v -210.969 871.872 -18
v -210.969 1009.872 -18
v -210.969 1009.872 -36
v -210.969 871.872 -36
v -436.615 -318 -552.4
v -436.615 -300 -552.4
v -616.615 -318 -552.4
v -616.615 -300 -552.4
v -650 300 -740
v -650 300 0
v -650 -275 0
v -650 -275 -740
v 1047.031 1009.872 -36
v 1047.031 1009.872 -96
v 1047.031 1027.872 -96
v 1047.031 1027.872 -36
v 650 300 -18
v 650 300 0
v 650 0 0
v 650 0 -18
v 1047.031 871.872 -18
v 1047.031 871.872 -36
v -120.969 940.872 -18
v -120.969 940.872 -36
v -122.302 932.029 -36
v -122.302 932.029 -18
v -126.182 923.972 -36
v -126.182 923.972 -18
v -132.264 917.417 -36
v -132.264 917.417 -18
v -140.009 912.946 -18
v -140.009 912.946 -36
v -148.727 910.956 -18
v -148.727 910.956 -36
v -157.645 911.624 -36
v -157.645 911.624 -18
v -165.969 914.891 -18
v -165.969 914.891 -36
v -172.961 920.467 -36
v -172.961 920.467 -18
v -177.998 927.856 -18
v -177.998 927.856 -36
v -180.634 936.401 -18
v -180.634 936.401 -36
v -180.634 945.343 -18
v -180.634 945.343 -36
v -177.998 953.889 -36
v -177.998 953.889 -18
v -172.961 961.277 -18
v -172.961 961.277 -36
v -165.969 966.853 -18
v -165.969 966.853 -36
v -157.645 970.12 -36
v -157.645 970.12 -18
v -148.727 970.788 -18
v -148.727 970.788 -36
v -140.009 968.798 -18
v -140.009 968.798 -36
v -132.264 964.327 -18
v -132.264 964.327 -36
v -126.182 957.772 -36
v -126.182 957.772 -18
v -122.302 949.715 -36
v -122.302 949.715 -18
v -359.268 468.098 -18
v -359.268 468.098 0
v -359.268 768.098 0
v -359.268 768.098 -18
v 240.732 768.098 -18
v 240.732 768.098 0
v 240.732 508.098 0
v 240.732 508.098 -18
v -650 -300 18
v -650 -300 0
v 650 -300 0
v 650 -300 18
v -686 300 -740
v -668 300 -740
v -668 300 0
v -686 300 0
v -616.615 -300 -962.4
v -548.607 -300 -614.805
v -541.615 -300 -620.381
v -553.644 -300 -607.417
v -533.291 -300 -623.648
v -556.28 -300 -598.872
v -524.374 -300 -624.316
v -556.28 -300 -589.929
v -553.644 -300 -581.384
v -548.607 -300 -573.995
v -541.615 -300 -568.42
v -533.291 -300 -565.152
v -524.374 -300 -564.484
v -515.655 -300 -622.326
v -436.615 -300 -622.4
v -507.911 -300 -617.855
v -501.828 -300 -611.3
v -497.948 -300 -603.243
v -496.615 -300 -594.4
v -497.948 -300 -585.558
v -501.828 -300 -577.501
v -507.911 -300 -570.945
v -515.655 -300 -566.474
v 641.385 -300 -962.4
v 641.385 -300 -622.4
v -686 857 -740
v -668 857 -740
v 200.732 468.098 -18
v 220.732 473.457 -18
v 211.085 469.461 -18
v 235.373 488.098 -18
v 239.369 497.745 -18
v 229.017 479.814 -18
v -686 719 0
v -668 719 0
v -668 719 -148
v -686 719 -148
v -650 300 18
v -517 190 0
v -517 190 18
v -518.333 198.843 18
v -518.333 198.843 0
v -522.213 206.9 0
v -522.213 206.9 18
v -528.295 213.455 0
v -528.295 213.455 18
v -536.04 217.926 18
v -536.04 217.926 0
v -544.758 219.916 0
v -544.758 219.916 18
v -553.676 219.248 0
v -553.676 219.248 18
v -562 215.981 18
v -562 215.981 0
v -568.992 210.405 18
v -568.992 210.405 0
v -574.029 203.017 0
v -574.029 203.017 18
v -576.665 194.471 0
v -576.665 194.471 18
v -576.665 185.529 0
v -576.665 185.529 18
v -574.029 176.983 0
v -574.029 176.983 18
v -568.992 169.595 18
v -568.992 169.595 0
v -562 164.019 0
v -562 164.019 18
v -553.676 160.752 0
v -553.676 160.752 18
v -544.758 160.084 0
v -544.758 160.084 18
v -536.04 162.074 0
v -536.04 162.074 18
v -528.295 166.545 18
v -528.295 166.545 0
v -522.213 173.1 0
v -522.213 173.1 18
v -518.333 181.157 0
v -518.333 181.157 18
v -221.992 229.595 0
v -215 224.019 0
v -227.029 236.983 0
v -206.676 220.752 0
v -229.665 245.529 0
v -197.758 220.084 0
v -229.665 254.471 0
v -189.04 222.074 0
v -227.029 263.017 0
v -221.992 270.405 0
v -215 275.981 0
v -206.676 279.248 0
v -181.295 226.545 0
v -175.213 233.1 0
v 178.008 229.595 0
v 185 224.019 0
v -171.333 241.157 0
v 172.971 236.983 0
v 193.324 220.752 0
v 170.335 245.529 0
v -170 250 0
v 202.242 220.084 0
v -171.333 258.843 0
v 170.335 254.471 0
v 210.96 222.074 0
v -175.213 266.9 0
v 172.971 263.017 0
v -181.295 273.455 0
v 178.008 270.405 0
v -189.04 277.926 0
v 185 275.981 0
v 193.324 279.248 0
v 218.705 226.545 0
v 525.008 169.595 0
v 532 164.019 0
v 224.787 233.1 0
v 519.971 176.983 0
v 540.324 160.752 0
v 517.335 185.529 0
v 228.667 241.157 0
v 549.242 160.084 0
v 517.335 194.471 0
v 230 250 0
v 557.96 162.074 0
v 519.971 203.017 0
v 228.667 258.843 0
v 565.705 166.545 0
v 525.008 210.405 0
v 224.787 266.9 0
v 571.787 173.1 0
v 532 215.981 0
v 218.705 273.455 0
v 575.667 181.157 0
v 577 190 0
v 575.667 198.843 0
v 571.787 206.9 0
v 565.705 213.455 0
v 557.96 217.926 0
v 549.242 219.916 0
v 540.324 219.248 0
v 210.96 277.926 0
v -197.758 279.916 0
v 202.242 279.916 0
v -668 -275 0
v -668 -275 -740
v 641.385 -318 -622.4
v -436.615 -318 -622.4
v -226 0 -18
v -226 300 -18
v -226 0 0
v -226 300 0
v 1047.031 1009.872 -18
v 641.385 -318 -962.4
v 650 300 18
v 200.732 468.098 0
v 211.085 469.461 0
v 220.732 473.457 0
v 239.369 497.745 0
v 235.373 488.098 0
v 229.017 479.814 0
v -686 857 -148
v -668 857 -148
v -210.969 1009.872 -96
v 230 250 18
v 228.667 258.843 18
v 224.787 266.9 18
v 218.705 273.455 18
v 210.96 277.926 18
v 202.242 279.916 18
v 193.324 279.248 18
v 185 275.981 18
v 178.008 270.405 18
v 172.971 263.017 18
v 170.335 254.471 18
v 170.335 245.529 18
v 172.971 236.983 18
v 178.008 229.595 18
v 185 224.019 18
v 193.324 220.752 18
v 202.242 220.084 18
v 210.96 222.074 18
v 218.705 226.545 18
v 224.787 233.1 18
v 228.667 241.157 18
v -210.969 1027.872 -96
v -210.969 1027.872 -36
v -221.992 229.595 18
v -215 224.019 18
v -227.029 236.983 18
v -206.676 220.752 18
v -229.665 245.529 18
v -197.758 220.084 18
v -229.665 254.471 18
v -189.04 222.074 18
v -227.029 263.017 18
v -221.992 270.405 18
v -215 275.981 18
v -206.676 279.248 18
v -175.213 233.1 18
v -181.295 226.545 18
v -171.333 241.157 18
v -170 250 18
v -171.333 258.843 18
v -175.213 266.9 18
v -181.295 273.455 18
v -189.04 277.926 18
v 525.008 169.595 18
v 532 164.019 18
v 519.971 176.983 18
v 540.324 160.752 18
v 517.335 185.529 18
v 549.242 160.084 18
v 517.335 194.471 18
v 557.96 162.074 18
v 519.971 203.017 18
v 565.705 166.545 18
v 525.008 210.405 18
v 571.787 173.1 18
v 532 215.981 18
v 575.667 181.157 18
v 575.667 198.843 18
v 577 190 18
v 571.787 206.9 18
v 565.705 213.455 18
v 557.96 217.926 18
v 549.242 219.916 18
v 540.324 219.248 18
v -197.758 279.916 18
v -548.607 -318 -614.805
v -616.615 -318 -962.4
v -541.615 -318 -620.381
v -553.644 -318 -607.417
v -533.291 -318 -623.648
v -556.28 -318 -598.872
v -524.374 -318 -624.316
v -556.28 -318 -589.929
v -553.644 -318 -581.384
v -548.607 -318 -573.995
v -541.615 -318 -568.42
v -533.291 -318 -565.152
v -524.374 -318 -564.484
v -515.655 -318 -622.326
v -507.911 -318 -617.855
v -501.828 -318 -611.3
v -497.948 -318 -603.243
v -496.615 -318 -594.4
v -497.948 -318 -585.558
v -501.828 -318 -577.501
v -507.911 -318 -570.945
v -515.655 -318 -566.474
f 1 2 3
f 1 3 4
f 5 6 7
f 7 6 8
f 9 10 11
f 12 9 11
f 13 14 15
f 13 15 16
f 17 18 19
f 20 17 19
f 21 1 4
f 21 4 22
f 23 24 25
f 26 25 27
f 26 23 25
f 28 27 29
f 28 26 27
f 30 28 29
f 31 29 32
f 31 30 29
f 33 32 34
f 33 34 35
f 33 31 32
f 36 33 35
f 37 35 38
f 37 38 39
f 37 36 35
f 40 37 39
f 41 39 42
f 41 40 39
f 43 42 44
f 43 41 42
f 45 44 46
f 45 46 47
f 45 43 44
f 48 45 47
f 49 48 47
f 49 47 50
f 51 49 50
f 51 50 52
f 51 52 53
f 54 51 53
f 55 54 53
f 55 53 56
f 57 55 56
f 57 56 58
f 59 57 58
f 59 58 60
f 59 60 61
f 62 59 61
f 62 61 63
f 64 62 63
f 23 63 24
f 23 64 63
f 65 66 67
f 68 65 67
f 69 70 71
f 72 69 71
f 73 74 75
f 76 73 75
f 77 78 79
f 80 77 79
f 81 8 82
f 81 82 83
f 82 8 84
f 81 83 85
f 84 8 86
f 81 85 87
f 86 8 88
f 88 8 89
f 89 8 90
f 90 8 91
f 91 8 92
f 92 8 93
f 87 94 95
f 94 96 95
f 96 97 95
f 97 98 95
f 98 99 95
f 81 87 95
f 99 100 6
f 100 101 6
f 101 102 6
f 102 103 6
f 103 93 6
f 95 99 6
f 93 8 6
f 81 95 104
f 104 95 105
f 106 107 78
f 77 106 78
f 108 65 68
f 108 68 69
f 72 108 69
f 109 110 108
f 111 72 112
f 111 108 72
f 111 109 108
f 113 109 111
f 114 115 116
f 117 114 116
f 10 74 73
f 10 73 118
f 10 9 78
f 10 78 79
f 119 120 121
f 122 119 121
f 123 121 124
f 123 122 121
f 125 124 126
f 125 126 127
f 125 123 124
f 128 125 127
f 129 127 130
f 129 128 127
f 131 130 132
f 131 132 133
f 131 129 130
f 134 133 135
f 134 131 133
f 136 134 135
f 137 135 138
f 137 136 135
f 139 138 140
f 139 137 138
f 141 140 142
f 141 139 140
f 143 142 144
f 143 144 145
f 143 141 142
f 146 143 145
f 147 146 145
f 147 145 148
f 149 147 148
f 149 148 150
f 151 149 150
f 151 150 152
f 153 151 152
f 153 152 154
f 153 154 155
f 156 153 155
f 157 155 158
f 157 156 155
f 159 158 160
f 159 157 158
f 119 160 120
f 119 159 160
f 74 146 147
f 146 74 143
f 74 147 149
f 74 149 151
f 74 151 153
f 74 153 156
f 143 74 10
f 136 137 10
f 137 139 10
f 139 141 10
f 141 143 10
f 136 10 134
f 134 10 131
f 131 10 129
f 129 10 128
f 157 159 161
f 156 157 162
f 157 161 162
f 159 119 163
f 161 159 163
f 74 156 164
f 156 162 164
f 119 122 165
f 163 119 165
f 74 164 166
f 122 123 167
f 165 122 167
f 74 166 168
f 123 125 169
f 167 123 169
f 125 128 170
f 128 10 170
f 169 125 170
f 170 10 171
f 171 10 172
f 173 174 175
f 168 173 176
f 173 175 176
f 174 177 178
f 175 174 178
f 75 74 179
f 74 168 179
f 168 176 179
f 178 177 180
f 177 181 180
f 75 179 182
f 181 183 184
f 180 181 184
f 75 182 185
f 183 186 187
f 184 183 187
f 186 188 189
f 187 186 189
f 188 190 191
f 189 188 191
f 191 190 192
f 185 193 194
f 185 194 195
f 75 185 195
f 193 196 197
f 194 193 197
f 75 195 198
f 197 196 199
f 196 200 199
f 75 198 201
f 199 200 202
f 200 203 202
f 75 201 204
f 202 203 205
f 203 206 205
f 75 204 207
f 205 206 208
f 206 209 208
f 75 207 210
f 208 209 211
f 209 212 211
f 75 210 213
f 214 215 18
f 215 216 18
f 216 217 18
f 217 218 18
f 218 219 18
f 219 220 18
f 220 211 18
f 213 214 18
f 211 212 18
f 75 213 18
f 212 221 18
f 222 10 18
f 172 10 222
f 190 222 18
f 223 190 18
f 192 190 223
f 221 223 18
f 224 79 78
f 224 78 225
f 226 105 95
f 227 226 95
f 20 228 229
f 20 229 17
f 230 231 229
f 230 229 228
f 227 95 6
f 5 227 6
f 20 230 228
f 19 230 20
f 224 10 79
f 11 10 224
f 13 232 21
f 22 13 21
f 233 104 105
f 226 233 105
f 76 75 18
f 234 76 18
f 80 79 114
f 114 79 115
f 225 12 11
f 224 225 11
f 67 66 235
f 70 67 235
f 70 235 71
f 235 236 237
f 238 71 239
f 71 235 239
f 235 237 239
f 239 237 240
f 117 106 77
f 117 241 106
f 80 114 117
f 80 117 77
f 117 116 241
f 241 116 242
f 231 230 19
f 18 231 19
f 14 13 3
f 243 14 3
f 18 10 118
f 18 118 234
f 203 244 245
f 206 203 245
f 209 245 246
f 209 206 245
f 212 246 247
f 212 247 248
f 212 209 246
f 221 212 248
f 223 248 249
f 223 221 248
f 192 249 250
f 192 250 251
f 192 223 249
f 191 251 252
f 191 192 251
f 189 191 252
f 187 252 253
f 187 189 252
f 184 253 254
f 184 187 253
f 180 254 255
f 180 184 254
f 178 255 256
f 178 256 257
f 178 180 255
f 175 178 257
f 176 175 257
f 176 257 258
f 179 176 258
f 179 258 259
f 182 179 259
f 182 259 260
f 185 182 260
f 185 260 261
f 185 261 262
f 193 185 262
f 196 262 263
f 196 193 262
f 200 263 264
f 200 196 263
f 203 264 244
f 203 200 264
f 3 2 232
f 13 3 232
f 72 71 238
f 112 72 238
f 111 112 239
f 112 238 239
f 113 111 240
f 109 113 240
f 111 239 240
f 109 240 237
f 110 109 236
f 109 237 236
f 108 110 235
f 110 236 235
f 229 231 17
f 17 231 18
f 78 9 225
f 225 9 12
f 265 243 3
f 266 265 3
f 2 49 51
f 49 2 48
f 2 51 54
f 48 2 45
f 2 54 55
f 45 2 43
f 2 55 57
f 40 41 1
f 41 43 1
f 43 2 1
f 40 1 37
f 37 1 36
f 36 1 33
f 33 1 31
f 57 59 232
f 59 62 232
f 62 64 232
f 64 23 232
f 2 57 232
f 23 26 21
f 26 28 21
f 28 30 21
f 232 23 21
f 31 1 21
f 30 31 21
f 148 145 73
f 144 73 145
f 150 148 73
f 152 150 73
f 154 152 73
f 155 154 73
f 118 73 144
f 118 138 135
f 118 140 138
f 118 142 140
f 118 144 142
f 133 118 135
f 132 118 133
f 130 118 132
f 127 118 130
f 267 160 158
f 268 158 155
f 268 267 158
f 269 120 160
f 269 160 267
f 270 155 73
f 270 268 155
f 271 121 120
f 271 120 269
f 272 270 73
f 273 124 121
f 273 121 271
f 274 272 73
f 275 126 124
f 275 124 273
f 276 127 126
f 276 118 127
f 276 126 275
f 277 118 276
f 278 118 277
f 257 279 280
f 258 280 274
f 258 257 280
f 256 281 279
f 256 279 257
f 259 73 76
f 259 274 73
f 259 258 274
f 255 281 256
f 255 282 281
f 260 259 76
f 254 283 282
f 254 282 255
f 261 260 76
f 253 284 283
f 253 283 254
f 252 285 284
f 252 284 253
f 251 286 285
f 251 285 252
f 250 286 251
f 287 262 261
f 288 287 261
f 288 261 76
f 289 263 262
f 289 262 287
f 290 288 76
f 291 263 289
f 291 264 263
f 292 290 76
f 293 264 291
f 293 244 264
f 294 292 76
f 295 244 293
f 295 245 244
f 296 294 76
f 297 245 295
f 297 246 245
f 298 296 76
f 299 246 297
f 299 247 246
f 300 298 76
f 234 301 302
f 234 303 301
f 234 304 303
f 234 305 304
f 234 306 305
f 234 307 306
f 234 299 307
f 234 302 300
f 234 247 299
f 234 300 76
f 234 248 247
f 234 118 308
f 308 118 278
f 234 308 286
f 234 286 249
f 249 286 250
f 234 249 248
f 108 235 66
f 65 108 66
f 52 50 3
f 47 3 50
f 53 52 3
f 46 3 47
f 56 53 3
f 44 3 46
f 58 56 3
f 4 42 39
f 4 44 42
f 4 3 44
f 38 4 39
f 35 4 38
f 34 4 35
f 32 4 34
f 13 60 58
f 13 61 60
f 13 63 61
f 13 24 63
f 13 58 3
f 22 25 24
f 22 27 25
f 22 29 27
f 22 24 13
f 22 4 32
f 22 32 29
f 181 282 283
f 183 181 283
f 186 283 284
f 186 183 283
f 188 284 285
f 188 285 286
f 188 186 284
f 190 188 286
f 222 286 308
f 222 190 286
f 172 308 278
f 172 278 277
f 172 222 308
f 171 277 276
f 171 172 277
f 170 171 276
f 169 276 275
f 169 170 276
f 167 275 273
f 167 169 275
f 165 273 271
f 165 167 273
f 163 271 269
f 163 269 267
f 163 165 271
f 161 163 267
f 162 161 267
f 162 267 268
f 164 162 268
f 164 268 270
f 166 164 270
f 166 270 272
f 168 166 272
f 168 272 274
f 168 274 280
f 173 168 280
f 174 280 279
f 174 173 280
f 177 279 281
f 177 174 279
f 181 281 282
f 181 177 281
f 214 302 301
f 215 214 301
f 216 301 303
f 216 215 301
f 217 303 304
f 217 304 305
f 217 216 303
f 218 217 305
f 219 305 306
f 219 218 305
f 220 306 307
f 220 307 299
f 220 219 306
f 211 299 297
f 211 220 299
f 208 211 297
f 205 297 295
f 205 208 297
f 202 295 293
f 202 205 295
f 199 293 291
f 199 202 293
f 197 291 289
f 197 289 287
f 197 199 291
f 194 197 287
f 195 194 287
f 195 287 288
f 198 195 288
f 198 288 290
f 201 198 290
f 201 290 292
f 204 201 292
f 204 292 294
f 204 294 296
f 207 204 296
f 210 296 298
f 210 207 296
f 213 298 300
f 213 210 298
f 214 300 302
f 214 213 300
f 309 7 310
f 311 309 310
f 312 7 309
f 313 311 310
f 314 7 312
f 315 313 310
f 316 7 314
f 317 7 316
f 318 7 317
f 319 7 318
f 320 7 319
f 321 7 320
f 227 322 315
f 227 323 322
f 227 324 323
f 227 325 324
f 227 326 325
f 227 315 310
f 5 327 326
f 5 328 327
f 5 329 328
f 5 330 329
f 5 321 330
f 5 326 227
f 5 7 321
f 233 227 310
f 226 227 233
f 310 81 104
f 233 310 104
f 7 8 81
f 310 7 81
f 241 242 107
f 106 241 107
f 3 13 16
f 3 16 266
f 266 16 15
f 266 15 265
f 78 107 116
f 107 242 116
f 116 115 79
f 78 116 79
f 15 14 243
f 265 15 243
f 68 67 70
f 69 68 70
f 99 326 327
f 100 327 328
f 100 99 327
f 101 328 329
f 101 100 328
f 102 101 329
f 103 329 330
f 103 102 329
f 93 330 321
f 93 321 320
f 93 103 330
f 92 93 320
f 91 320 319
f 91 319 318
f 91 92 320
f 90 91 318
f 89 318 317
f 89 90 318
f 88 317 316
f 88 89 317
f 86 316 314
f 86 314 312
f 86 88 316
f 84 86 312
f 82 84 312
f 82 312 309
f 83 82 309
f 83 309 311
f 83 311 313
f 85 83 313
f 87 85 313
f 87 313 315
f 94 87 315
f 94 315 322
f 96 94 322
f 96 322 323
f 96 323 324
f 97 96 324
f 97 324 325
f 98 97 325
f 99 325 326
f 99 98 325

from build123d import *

# Parameters (mm, degrees)
F0_W      = 1300
F0_H      = 600
F0_R      = 30
F1_DEPTH  = 18
F2_W      = 575
F2_H      = 740
F3_DEPTH  = 18
F5_DEPTH  = 18
F7_DEPTH  = 18
F8_R      = 30
F9_DEPTH  = 18
F10_W     = 876
F10_H     = 300
F11_DEPTH = 18
F12_W     = 1258
F12_H     = 138
F12_R     = 30
F13_DEPTH = 18
F14_W     = 1258
F14_H     = 60
F15_DEPTH = 18


with BuildPart() as f1:
    # F0 (on Top) → F1 (new body)
    with BuildSketch(Plane.XY):
        Rectangle(F0_W, F0_H)
        with Locations((-547, 190)):
            Circle(F0_R, mode=Mode.SUBTRACT)
        with Locations((-200, 250)):
            Circle(F0_R, mode=Mode.SUBTRACT)
        with Locations((200, 250)):
            Circle(F0_R, mode=Mode.SUBTRACT)
        with Locations((547, 190)):
            Circle(F0_R, mode=Mode.SUBTRACT)
    extrude(amount=F1_DEPTH)


with BuildPart() as f3:
    # F2 (on face) → F3 (new body)
    with BuildSketch(Plane(origin=(-650, 0, 0), x_dir=(0, -1, 0), z_dir=(-1, 0, 0))):
        with Locations((-12.5, -370)):
            Rectangle(F2_W, F2_H)
    extrude(amount=F3_DEPTH)


with BuildPart() as f5:
    # F4 (on face) → F5 (new body)
    with BuildSketch(Plane(origin=(-668, 0, 0), x_dir=(0, -1, 0), z_dir=(-1, 0, 0))):
        Polygon((-857, -740), (-300, -740), (-300, 0), (-719, 0), (-719, -148), (-857, -148), align=None)
    extrude(amount=F5_DEPTH)


with BuildPart() as f7:
    # F6 (on face) → F7 (new body)
    with BuildSketch(Plane(origin=(0, 0, 0), x_dir=(1, 0, 0), z_dir=(0, 0, -1))):
        with BuildLine():
            Line((200.73227, -468.097812), (-359.26773, -468.097812))
            Line((-359.26773, -468.097812), (-359.26773, -768.097812))
            Line((-359.26773, -768.097812), (240.73227, -768.097812))
            Line((240.73227, -768.097812), (240.73227, -508.097812))
            ThreePointArc((240.73227, -508.097812), (229.016541, -479.813541), (200.73227, -468.097812))
        make_face()
    extrude(amount=F7_DEPTH)


with BuildPart() as f9:
    # F8 (on face) → F9 (new body)
    with BuildSketch(Plane.XZ.offset(300)):
        Polygon((641.384593, -622.400284), (-436.615407, -622.400284), (-436.615407, -552.400284), (-616.615407, -552.400284), (-616.615407, -962.400284), (641.384593, -962.400284), align=None)
        with Locations((-526.615407, -594.400284)):
            Circle(F8_R, mode=Mode.SUBTRACT)
    extrude(amount=F9_DEPTH)


with BuildPart() as f11:
    # F10 (on face) → F11 (new body)
    with BuildSketch(Plane(origin=(0, 0, 0), x_dir=(1, 0, 0), z_dir=(0, 0, -1))):
        with Locations((212, -150)):
            Rectangle(F10_W, F10_H)
    extrude(amount=F11_DEPTH)


with BuildPart() as f13:
    # F12 (on face) → F13 (new body)
    with BuildSketch(Plane(origin=(0, 0, -18), x_dir=(1, 0, 0), z_dir=(0, 0, -1))):
        with Locations((418.031032, -940.872043)):
            Rectangle(F12_W, F12_H)
        with Locations((-150.968968, -940.872043)):
            Circle(F12_R, mode=Mode.SUBTRACT)
    extrude(amount=F13_DEPTH)


with BuildPart() as f15:
    # F14 (on face) → F15 (new body)
    with BuildSketch(Plane(origin=(0, 1009.872043, 0), x_dir=(-1, 0, 0), z_dir=(0, 1, 0))):
        with Locations((-418.031032, -66)):
            Rectangle(F14_W, F14_H)
    extrude(amount=F15_DEPTH)


solid = Compound([f1.part, f3.part, f5.part, f7.part, f9.part, f11.part, f13.part, f15.part])
